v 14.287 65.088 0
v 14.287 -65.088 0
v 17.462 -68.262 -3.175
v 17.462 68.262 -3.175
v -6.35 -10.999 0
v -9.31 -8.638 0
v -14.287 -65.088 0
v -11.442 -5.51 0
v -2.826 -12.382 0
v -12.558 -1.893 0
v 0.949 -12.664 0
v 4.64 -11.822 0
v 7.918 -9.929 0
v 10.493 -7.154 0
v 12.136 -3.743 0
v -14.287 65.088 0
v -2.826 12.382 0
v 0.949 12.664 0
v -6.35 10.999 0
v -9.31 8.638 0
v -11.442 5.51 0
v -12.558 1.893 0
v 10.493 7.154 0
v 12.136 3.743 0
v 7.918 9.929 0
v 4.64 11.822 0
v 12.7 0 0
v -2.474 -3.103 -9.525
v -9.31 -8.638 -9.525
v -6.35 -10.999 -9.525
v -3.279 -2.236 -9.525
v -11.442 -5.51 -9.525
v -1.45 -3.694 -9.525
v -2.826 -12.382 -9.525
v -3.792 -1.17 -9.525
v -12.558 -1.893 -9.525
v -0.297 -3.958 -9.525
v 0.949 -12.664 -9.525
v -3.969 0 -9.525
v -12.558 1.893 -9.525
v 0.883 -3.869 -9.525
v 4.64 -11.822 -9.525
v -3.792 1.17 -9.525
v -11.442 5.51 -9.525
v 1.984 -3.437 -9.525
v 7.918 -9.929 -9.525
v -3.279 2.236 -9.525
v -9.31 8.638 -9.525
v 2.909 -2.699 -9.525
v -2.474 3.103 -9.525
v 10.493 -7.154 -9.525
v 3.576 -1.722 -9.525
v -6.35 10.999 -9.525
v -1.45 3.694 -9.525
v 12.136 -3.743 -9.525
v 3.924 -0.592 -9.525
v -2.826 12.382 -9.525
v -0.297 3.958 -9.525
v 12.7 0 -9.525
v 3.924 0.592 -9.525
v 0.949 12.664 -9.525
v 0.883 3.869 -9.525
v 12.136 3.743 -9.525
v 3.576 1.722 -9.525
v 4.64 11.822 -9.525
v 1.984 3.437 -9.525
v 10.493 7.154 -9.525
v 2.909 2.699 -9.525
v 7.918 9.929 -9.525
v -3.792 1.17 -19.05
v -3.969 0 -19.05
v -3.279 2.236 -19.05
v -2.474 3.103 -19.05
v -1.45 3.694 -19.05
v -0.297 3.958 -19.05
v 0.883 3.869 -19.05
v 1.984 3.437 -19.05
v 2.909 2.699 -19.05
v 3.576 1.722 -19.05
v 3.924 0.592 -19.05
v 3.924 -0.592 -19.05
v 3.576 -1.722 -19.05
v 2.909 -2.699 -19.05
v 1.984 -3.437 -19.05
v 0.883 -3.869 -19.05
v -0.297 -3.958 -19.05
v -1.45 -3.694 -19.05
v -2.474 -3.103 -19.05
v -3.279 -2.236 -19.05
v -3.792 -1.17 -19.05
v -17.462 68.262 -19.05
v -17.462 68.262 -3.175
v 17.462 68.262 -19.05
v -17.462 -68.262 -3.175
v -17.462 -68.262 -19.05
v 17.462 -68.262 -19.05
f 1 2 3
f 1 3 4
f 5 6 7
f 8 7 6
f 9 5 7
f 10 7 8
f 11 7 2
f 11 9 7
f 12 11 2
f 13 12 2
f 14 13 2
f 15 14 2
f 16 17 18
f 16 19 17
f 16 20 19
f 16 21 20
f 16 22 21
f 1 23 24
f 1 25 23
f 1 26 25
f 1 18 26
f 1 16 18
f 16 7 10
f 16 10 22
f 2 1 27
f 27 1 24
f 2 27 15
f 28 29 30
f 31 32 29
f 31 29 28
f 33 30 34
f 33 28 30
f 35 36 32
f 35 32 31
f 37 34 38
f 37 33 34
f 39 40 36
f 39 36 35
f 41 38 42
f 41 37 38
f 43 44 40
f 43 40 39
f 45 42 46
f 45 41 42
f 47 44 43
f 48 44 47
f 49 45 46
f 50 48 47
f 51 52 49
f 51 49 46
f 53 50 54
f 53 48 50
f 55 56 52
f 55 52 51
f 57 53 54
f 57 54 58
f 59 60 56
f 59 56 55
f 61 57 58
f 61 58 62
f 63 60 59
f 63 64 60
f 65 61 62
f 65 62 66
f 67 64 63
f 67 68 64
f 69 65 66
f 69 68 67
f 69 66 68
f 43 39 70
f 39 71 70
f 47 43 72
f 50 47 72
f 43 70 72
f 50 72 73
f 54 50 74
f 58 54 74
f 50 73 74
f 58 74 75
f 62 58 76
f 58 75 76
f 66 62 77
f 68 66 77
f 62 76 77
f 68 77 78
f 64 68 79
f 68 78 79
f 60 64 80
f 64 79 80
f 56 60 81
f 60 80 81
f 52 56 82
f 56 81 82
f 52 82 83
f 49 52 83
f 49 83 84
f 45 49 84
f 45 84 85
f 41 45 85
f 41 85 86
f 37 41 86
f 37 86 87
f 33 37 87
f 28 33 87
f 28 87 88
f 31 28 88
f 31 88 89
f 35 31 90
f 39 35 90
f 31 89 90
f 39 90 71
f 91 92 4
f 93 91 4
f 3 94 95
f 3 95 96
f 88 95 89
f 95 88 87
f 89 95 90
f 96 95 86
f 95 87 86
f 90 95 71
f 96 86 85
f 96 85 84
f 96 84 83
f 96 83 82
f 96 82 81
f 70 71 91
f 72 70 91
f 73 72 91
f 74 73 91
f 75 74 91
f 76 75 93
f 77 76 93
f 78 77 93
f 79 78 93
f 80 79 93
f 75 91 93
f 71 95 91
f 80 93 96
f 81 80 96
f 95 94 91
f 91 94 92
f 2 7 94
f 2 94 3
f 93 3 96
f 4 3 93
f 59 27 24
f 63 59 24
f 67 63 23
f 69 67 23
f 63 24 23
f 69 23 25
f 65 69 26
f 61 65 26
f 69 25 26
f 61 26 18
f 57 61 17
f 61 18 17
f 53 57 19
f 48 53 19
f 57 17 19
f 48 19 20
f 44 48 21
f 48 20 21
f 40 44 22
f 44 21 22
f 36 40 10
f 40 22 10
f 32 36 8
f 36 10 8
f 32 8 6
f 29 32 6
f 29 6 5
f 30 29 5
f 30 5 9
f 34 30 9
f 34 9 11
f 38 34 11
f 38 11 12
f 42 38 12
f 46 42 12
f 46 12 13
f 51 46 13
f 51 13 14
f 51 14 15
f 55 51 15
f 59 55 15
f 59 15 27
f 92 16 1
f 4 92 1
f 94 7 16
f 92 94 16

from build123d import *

# Parameters (mm, degrees)
F0_W           = 34.925
F0_H           = 136.525
F1_DEPTH       = 19.05
F2_SIZE2       = 3.175
F2_SIZE        = 3.175
F4_D           = 7.9375
F4_CBORE_D     = 25.4
F4_CBORE_DEPTH = 9.525


with BuildPart() as f1:
    # F0 (on Top) → F1 (new body)
    with BuildSketch(Plane.XY):
        Rectangle(F0_W, F0_H)
    extrude(amount=-F1_DEPTH)

    # F2
    f2_edges = [f1.edges().sort_by_distance(p)[0] for p in [
        (0, 68.2625, 0),
        (-17.4625, 0, 0),
        (0, -68.2625, 0),
        (17.4625, 0, 0),
    ]]
    chamfer(f2_edges, length=F2_SIZE, length2=F2_SIZE2)

    # F4 (through all)
    with Locations(Plane.XY):
        with Locations((0, 0)):
            CounterBoreHole(F4_D / 2, F4_CBORE_D / 2, F4_CBORE_DEPTH)


solid = f1.part
